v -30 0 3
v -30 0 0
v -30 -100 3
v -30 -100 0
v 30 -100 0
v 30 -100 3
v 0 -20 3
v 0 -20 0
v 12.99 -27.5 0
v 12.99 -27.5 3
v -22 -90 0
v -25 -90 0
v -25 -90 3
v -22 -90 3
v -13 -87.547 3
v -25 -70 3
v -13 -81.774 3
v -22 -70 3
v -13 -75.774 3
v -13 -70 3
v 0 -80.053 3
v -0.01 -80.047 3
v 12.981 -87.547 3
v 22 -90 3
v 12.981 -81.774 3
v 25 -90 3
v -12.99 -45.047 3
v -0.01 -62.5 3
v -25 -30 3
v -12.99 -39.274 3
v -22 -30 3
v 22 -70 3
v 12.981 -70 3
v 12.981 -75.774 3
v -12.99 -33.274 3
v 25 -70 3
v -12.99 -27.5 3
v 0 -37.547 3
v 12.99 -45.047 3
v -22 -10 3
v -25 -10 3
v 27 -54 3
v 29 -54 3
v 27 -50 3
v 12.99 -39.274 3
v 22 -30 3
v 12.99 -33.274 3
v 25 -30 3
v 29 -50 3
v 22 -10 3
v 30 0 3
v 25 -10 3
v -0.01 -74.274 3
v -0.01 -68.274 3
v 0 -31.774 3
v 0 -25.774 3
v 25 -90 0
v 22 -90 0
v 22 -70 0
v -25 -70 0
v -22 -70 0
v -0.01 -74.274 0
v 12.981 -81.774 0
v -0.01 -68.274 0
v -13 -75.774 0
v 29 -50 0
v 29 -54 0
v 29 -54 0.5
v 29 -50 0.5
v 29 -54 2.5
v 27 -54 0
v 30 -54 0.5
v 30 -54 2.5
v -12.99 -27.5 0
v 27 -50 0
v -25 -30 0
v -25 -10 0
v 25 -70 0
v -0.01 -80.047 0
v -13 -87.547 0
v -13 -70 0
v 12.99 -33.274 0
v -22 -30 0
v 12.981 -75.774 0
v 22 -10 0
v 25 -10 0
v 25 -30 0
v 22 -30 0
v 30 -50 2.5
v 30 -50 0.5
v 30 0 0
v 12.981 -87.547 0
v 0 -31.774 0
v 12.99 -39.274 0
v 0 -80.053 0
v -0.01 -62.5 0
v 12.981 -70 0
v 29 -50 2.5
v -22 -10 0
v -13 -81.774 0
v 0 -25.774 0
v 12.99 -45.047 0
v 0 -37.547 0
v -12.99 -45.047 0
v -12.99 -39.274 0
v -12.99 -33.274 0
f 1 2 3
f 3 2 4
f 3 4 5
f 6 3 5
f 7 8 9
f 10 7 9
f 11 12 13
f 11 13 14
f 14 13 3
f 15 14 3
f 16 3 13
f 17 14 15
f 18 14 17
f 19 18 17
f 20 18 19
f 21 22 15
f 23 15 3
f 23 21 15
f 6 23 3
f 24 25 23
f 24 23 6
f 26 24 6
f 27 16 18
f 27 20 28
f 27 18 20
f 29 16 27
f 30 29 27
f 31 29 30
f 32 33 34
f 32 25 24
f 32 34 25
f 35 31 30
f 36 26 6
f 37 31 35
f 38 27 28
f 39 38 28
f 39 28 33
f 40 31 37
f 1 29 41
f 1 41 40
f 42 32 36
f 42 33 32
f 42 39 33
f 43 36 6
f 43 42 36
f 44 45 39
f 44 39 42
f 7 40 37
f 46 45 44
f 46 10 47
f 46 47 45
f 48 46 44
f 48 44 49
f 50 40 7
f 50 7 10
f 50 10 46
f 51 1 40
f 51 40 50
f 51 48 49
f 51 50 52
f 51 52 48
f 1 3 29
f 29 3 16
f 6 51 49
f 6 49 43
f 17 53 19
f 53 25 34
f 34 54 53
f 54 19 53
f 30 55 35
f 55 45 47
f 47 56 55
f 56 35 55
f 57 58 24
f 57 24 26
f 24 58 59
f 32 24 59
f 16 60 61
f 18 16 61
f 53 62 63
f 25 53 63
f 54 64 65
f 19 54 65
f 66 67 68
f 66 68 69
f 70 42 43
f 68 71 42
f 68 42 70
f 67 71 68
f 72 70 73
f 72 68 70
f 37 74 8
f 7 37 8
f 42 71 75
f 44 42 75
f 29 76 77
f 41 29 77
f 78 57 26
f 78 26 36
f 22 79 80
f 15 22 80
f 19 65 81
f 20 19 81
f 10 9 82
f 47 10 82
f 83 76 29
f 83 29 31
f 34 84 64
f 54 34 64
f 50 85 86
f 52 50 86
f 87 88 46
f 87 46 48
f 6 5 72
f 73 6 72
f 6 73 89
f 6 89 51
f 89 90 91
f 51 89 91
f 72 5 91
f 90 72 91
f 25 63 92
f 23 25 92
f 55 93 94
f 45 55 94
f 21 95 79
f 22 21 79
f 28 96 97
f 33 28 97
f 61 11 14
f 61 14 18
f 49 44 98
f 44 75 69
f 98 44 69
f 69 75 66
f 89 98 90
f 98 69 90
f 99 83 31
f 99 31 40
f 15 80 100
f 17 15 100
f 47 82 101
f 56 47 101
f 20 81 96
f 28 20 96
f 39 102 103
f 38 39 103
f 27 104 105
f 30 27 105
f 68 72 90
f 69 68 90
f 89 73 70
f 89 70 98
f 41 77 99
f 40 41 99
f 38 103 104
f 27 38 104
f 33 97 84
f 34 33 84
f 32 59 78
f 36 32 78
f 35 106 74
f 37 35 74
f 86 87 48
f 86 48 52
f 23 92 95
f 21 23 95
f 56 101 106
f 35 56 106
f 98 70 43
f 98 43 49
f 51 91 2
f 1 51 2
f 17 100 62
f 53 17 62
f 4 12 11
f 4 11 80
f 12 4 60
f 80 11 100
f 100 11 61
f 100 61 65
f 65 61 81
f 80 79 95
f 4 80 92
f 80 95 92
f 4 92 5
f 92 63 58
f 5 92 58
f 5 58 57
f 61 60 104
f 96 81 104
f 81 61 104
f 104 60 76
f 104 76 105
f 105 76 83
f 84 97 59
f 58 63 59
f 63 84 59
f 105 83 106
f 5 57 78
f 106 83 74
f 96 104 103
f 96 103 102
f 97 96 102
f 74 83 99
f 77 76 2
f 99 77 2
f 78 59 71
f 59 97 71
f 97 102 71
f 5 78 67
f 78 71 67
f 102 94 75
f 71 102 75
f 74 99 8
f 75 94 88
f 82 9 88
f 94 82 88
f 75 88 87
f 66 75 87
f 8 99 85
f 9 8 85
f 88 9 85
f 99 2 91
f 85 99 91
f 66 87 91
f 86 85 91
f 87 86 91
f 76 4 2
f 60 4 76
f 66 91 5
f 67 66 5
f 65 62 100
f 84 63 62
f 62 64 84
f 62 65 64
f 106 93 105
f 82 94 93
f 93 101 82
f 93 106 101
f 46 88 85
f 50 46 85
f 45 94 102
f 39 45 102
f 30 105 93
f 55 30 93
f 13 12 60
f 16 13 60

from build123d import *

# Parameters (mm, degrees)
F0_W     = 3
F0_H     = 20
F0_W_2   = 2
F0_H_2   = 4
F1_DEPTH = 3
F3_W     = 4
F3_H     = 2
F4_DEPTH = 3


with BuildPart() as f1:
    # F0 (on Top) → F1 (new body)
    with BuildSketch(Plane.XY):
        Polygon((-25, 0), (-30, 0), (-30, -50), (0, 0), align=None)
        with Locations((-23.5, -20)):
            Rectangle(F0_W, F0_H, mode=Mode.SUBTRACT)
        Polygon((0, 0), (-30, -50), (-30, -100), (0, -100), (30, -100), (30, -50), (30, 0), align=None)
        with Locations((-23.5, -80)):
            Rectangle(F0_W, F0_H, mode=Mode.SUBTRACT)
        Polygon((12.9807621135, -87.5470053838), (0, -80.0525588833), (-0.0096189432, -80.0470053838), (-13, -87.5470053838), (-13, -81.7735026919), (-0.0096189432, -74.2735026919), (12.9807621135, -81.7735026919), align=None, mode=Mode.SUBTRACT)
        Polygon((-13, -70), (-0.0096189432, -62.5), (12.9807621135, -70), (12.9807621135, -75.7735026919), (-0.0096189432, -68.2735026919), (-13, -75.7735026919), align=None, mode=Mode.SUBTRACT)
        with Locations((23.5, -80)):
            Rectangle(F0_W, F0_H, mode=Mode.SUBTRACT)
        with Locations((28, -52)):
            Rectangle(F0_W_2, F0_H_2, mode=Mode.SUBTRACT)
        Polygon((-12.9903810568, -39.2735026919), (0, -31.7735026919), (12.9903810568, -39.2735026919), (12.9903810568, -45.0470053838), (0, -37.5470053838), (-12.9903810568, -45.0470053838), align=None, mode=Mode.SUBTRACT)
        Polygon((-12.9903810568, -27.5), (0, -20), (12.9903810568, -27.5), (12.9903810568, -33.2735026919), (0, -25.7735026919), (-12.9903810568, -33.2735026919), align=None, mode=Mode.SUBTRACT)
        with Locations((23.5, -20)):
            Rectangle(F0_W, F0_H, mode=Mode.SUBTRACT)
    extrude(amount=F1_DEPTH)

    # F3 (on offset) → F4 (cut, through all)
    with BuildSketch(Plane.YZ.offset(30)):
        with Locations((-52, 1.5)):
            Rectangle(F3_W, F3_H)
    extrude(amount=-F4_DEPTH, mode=Mode.SUBTRACT)


solid = f1.part
